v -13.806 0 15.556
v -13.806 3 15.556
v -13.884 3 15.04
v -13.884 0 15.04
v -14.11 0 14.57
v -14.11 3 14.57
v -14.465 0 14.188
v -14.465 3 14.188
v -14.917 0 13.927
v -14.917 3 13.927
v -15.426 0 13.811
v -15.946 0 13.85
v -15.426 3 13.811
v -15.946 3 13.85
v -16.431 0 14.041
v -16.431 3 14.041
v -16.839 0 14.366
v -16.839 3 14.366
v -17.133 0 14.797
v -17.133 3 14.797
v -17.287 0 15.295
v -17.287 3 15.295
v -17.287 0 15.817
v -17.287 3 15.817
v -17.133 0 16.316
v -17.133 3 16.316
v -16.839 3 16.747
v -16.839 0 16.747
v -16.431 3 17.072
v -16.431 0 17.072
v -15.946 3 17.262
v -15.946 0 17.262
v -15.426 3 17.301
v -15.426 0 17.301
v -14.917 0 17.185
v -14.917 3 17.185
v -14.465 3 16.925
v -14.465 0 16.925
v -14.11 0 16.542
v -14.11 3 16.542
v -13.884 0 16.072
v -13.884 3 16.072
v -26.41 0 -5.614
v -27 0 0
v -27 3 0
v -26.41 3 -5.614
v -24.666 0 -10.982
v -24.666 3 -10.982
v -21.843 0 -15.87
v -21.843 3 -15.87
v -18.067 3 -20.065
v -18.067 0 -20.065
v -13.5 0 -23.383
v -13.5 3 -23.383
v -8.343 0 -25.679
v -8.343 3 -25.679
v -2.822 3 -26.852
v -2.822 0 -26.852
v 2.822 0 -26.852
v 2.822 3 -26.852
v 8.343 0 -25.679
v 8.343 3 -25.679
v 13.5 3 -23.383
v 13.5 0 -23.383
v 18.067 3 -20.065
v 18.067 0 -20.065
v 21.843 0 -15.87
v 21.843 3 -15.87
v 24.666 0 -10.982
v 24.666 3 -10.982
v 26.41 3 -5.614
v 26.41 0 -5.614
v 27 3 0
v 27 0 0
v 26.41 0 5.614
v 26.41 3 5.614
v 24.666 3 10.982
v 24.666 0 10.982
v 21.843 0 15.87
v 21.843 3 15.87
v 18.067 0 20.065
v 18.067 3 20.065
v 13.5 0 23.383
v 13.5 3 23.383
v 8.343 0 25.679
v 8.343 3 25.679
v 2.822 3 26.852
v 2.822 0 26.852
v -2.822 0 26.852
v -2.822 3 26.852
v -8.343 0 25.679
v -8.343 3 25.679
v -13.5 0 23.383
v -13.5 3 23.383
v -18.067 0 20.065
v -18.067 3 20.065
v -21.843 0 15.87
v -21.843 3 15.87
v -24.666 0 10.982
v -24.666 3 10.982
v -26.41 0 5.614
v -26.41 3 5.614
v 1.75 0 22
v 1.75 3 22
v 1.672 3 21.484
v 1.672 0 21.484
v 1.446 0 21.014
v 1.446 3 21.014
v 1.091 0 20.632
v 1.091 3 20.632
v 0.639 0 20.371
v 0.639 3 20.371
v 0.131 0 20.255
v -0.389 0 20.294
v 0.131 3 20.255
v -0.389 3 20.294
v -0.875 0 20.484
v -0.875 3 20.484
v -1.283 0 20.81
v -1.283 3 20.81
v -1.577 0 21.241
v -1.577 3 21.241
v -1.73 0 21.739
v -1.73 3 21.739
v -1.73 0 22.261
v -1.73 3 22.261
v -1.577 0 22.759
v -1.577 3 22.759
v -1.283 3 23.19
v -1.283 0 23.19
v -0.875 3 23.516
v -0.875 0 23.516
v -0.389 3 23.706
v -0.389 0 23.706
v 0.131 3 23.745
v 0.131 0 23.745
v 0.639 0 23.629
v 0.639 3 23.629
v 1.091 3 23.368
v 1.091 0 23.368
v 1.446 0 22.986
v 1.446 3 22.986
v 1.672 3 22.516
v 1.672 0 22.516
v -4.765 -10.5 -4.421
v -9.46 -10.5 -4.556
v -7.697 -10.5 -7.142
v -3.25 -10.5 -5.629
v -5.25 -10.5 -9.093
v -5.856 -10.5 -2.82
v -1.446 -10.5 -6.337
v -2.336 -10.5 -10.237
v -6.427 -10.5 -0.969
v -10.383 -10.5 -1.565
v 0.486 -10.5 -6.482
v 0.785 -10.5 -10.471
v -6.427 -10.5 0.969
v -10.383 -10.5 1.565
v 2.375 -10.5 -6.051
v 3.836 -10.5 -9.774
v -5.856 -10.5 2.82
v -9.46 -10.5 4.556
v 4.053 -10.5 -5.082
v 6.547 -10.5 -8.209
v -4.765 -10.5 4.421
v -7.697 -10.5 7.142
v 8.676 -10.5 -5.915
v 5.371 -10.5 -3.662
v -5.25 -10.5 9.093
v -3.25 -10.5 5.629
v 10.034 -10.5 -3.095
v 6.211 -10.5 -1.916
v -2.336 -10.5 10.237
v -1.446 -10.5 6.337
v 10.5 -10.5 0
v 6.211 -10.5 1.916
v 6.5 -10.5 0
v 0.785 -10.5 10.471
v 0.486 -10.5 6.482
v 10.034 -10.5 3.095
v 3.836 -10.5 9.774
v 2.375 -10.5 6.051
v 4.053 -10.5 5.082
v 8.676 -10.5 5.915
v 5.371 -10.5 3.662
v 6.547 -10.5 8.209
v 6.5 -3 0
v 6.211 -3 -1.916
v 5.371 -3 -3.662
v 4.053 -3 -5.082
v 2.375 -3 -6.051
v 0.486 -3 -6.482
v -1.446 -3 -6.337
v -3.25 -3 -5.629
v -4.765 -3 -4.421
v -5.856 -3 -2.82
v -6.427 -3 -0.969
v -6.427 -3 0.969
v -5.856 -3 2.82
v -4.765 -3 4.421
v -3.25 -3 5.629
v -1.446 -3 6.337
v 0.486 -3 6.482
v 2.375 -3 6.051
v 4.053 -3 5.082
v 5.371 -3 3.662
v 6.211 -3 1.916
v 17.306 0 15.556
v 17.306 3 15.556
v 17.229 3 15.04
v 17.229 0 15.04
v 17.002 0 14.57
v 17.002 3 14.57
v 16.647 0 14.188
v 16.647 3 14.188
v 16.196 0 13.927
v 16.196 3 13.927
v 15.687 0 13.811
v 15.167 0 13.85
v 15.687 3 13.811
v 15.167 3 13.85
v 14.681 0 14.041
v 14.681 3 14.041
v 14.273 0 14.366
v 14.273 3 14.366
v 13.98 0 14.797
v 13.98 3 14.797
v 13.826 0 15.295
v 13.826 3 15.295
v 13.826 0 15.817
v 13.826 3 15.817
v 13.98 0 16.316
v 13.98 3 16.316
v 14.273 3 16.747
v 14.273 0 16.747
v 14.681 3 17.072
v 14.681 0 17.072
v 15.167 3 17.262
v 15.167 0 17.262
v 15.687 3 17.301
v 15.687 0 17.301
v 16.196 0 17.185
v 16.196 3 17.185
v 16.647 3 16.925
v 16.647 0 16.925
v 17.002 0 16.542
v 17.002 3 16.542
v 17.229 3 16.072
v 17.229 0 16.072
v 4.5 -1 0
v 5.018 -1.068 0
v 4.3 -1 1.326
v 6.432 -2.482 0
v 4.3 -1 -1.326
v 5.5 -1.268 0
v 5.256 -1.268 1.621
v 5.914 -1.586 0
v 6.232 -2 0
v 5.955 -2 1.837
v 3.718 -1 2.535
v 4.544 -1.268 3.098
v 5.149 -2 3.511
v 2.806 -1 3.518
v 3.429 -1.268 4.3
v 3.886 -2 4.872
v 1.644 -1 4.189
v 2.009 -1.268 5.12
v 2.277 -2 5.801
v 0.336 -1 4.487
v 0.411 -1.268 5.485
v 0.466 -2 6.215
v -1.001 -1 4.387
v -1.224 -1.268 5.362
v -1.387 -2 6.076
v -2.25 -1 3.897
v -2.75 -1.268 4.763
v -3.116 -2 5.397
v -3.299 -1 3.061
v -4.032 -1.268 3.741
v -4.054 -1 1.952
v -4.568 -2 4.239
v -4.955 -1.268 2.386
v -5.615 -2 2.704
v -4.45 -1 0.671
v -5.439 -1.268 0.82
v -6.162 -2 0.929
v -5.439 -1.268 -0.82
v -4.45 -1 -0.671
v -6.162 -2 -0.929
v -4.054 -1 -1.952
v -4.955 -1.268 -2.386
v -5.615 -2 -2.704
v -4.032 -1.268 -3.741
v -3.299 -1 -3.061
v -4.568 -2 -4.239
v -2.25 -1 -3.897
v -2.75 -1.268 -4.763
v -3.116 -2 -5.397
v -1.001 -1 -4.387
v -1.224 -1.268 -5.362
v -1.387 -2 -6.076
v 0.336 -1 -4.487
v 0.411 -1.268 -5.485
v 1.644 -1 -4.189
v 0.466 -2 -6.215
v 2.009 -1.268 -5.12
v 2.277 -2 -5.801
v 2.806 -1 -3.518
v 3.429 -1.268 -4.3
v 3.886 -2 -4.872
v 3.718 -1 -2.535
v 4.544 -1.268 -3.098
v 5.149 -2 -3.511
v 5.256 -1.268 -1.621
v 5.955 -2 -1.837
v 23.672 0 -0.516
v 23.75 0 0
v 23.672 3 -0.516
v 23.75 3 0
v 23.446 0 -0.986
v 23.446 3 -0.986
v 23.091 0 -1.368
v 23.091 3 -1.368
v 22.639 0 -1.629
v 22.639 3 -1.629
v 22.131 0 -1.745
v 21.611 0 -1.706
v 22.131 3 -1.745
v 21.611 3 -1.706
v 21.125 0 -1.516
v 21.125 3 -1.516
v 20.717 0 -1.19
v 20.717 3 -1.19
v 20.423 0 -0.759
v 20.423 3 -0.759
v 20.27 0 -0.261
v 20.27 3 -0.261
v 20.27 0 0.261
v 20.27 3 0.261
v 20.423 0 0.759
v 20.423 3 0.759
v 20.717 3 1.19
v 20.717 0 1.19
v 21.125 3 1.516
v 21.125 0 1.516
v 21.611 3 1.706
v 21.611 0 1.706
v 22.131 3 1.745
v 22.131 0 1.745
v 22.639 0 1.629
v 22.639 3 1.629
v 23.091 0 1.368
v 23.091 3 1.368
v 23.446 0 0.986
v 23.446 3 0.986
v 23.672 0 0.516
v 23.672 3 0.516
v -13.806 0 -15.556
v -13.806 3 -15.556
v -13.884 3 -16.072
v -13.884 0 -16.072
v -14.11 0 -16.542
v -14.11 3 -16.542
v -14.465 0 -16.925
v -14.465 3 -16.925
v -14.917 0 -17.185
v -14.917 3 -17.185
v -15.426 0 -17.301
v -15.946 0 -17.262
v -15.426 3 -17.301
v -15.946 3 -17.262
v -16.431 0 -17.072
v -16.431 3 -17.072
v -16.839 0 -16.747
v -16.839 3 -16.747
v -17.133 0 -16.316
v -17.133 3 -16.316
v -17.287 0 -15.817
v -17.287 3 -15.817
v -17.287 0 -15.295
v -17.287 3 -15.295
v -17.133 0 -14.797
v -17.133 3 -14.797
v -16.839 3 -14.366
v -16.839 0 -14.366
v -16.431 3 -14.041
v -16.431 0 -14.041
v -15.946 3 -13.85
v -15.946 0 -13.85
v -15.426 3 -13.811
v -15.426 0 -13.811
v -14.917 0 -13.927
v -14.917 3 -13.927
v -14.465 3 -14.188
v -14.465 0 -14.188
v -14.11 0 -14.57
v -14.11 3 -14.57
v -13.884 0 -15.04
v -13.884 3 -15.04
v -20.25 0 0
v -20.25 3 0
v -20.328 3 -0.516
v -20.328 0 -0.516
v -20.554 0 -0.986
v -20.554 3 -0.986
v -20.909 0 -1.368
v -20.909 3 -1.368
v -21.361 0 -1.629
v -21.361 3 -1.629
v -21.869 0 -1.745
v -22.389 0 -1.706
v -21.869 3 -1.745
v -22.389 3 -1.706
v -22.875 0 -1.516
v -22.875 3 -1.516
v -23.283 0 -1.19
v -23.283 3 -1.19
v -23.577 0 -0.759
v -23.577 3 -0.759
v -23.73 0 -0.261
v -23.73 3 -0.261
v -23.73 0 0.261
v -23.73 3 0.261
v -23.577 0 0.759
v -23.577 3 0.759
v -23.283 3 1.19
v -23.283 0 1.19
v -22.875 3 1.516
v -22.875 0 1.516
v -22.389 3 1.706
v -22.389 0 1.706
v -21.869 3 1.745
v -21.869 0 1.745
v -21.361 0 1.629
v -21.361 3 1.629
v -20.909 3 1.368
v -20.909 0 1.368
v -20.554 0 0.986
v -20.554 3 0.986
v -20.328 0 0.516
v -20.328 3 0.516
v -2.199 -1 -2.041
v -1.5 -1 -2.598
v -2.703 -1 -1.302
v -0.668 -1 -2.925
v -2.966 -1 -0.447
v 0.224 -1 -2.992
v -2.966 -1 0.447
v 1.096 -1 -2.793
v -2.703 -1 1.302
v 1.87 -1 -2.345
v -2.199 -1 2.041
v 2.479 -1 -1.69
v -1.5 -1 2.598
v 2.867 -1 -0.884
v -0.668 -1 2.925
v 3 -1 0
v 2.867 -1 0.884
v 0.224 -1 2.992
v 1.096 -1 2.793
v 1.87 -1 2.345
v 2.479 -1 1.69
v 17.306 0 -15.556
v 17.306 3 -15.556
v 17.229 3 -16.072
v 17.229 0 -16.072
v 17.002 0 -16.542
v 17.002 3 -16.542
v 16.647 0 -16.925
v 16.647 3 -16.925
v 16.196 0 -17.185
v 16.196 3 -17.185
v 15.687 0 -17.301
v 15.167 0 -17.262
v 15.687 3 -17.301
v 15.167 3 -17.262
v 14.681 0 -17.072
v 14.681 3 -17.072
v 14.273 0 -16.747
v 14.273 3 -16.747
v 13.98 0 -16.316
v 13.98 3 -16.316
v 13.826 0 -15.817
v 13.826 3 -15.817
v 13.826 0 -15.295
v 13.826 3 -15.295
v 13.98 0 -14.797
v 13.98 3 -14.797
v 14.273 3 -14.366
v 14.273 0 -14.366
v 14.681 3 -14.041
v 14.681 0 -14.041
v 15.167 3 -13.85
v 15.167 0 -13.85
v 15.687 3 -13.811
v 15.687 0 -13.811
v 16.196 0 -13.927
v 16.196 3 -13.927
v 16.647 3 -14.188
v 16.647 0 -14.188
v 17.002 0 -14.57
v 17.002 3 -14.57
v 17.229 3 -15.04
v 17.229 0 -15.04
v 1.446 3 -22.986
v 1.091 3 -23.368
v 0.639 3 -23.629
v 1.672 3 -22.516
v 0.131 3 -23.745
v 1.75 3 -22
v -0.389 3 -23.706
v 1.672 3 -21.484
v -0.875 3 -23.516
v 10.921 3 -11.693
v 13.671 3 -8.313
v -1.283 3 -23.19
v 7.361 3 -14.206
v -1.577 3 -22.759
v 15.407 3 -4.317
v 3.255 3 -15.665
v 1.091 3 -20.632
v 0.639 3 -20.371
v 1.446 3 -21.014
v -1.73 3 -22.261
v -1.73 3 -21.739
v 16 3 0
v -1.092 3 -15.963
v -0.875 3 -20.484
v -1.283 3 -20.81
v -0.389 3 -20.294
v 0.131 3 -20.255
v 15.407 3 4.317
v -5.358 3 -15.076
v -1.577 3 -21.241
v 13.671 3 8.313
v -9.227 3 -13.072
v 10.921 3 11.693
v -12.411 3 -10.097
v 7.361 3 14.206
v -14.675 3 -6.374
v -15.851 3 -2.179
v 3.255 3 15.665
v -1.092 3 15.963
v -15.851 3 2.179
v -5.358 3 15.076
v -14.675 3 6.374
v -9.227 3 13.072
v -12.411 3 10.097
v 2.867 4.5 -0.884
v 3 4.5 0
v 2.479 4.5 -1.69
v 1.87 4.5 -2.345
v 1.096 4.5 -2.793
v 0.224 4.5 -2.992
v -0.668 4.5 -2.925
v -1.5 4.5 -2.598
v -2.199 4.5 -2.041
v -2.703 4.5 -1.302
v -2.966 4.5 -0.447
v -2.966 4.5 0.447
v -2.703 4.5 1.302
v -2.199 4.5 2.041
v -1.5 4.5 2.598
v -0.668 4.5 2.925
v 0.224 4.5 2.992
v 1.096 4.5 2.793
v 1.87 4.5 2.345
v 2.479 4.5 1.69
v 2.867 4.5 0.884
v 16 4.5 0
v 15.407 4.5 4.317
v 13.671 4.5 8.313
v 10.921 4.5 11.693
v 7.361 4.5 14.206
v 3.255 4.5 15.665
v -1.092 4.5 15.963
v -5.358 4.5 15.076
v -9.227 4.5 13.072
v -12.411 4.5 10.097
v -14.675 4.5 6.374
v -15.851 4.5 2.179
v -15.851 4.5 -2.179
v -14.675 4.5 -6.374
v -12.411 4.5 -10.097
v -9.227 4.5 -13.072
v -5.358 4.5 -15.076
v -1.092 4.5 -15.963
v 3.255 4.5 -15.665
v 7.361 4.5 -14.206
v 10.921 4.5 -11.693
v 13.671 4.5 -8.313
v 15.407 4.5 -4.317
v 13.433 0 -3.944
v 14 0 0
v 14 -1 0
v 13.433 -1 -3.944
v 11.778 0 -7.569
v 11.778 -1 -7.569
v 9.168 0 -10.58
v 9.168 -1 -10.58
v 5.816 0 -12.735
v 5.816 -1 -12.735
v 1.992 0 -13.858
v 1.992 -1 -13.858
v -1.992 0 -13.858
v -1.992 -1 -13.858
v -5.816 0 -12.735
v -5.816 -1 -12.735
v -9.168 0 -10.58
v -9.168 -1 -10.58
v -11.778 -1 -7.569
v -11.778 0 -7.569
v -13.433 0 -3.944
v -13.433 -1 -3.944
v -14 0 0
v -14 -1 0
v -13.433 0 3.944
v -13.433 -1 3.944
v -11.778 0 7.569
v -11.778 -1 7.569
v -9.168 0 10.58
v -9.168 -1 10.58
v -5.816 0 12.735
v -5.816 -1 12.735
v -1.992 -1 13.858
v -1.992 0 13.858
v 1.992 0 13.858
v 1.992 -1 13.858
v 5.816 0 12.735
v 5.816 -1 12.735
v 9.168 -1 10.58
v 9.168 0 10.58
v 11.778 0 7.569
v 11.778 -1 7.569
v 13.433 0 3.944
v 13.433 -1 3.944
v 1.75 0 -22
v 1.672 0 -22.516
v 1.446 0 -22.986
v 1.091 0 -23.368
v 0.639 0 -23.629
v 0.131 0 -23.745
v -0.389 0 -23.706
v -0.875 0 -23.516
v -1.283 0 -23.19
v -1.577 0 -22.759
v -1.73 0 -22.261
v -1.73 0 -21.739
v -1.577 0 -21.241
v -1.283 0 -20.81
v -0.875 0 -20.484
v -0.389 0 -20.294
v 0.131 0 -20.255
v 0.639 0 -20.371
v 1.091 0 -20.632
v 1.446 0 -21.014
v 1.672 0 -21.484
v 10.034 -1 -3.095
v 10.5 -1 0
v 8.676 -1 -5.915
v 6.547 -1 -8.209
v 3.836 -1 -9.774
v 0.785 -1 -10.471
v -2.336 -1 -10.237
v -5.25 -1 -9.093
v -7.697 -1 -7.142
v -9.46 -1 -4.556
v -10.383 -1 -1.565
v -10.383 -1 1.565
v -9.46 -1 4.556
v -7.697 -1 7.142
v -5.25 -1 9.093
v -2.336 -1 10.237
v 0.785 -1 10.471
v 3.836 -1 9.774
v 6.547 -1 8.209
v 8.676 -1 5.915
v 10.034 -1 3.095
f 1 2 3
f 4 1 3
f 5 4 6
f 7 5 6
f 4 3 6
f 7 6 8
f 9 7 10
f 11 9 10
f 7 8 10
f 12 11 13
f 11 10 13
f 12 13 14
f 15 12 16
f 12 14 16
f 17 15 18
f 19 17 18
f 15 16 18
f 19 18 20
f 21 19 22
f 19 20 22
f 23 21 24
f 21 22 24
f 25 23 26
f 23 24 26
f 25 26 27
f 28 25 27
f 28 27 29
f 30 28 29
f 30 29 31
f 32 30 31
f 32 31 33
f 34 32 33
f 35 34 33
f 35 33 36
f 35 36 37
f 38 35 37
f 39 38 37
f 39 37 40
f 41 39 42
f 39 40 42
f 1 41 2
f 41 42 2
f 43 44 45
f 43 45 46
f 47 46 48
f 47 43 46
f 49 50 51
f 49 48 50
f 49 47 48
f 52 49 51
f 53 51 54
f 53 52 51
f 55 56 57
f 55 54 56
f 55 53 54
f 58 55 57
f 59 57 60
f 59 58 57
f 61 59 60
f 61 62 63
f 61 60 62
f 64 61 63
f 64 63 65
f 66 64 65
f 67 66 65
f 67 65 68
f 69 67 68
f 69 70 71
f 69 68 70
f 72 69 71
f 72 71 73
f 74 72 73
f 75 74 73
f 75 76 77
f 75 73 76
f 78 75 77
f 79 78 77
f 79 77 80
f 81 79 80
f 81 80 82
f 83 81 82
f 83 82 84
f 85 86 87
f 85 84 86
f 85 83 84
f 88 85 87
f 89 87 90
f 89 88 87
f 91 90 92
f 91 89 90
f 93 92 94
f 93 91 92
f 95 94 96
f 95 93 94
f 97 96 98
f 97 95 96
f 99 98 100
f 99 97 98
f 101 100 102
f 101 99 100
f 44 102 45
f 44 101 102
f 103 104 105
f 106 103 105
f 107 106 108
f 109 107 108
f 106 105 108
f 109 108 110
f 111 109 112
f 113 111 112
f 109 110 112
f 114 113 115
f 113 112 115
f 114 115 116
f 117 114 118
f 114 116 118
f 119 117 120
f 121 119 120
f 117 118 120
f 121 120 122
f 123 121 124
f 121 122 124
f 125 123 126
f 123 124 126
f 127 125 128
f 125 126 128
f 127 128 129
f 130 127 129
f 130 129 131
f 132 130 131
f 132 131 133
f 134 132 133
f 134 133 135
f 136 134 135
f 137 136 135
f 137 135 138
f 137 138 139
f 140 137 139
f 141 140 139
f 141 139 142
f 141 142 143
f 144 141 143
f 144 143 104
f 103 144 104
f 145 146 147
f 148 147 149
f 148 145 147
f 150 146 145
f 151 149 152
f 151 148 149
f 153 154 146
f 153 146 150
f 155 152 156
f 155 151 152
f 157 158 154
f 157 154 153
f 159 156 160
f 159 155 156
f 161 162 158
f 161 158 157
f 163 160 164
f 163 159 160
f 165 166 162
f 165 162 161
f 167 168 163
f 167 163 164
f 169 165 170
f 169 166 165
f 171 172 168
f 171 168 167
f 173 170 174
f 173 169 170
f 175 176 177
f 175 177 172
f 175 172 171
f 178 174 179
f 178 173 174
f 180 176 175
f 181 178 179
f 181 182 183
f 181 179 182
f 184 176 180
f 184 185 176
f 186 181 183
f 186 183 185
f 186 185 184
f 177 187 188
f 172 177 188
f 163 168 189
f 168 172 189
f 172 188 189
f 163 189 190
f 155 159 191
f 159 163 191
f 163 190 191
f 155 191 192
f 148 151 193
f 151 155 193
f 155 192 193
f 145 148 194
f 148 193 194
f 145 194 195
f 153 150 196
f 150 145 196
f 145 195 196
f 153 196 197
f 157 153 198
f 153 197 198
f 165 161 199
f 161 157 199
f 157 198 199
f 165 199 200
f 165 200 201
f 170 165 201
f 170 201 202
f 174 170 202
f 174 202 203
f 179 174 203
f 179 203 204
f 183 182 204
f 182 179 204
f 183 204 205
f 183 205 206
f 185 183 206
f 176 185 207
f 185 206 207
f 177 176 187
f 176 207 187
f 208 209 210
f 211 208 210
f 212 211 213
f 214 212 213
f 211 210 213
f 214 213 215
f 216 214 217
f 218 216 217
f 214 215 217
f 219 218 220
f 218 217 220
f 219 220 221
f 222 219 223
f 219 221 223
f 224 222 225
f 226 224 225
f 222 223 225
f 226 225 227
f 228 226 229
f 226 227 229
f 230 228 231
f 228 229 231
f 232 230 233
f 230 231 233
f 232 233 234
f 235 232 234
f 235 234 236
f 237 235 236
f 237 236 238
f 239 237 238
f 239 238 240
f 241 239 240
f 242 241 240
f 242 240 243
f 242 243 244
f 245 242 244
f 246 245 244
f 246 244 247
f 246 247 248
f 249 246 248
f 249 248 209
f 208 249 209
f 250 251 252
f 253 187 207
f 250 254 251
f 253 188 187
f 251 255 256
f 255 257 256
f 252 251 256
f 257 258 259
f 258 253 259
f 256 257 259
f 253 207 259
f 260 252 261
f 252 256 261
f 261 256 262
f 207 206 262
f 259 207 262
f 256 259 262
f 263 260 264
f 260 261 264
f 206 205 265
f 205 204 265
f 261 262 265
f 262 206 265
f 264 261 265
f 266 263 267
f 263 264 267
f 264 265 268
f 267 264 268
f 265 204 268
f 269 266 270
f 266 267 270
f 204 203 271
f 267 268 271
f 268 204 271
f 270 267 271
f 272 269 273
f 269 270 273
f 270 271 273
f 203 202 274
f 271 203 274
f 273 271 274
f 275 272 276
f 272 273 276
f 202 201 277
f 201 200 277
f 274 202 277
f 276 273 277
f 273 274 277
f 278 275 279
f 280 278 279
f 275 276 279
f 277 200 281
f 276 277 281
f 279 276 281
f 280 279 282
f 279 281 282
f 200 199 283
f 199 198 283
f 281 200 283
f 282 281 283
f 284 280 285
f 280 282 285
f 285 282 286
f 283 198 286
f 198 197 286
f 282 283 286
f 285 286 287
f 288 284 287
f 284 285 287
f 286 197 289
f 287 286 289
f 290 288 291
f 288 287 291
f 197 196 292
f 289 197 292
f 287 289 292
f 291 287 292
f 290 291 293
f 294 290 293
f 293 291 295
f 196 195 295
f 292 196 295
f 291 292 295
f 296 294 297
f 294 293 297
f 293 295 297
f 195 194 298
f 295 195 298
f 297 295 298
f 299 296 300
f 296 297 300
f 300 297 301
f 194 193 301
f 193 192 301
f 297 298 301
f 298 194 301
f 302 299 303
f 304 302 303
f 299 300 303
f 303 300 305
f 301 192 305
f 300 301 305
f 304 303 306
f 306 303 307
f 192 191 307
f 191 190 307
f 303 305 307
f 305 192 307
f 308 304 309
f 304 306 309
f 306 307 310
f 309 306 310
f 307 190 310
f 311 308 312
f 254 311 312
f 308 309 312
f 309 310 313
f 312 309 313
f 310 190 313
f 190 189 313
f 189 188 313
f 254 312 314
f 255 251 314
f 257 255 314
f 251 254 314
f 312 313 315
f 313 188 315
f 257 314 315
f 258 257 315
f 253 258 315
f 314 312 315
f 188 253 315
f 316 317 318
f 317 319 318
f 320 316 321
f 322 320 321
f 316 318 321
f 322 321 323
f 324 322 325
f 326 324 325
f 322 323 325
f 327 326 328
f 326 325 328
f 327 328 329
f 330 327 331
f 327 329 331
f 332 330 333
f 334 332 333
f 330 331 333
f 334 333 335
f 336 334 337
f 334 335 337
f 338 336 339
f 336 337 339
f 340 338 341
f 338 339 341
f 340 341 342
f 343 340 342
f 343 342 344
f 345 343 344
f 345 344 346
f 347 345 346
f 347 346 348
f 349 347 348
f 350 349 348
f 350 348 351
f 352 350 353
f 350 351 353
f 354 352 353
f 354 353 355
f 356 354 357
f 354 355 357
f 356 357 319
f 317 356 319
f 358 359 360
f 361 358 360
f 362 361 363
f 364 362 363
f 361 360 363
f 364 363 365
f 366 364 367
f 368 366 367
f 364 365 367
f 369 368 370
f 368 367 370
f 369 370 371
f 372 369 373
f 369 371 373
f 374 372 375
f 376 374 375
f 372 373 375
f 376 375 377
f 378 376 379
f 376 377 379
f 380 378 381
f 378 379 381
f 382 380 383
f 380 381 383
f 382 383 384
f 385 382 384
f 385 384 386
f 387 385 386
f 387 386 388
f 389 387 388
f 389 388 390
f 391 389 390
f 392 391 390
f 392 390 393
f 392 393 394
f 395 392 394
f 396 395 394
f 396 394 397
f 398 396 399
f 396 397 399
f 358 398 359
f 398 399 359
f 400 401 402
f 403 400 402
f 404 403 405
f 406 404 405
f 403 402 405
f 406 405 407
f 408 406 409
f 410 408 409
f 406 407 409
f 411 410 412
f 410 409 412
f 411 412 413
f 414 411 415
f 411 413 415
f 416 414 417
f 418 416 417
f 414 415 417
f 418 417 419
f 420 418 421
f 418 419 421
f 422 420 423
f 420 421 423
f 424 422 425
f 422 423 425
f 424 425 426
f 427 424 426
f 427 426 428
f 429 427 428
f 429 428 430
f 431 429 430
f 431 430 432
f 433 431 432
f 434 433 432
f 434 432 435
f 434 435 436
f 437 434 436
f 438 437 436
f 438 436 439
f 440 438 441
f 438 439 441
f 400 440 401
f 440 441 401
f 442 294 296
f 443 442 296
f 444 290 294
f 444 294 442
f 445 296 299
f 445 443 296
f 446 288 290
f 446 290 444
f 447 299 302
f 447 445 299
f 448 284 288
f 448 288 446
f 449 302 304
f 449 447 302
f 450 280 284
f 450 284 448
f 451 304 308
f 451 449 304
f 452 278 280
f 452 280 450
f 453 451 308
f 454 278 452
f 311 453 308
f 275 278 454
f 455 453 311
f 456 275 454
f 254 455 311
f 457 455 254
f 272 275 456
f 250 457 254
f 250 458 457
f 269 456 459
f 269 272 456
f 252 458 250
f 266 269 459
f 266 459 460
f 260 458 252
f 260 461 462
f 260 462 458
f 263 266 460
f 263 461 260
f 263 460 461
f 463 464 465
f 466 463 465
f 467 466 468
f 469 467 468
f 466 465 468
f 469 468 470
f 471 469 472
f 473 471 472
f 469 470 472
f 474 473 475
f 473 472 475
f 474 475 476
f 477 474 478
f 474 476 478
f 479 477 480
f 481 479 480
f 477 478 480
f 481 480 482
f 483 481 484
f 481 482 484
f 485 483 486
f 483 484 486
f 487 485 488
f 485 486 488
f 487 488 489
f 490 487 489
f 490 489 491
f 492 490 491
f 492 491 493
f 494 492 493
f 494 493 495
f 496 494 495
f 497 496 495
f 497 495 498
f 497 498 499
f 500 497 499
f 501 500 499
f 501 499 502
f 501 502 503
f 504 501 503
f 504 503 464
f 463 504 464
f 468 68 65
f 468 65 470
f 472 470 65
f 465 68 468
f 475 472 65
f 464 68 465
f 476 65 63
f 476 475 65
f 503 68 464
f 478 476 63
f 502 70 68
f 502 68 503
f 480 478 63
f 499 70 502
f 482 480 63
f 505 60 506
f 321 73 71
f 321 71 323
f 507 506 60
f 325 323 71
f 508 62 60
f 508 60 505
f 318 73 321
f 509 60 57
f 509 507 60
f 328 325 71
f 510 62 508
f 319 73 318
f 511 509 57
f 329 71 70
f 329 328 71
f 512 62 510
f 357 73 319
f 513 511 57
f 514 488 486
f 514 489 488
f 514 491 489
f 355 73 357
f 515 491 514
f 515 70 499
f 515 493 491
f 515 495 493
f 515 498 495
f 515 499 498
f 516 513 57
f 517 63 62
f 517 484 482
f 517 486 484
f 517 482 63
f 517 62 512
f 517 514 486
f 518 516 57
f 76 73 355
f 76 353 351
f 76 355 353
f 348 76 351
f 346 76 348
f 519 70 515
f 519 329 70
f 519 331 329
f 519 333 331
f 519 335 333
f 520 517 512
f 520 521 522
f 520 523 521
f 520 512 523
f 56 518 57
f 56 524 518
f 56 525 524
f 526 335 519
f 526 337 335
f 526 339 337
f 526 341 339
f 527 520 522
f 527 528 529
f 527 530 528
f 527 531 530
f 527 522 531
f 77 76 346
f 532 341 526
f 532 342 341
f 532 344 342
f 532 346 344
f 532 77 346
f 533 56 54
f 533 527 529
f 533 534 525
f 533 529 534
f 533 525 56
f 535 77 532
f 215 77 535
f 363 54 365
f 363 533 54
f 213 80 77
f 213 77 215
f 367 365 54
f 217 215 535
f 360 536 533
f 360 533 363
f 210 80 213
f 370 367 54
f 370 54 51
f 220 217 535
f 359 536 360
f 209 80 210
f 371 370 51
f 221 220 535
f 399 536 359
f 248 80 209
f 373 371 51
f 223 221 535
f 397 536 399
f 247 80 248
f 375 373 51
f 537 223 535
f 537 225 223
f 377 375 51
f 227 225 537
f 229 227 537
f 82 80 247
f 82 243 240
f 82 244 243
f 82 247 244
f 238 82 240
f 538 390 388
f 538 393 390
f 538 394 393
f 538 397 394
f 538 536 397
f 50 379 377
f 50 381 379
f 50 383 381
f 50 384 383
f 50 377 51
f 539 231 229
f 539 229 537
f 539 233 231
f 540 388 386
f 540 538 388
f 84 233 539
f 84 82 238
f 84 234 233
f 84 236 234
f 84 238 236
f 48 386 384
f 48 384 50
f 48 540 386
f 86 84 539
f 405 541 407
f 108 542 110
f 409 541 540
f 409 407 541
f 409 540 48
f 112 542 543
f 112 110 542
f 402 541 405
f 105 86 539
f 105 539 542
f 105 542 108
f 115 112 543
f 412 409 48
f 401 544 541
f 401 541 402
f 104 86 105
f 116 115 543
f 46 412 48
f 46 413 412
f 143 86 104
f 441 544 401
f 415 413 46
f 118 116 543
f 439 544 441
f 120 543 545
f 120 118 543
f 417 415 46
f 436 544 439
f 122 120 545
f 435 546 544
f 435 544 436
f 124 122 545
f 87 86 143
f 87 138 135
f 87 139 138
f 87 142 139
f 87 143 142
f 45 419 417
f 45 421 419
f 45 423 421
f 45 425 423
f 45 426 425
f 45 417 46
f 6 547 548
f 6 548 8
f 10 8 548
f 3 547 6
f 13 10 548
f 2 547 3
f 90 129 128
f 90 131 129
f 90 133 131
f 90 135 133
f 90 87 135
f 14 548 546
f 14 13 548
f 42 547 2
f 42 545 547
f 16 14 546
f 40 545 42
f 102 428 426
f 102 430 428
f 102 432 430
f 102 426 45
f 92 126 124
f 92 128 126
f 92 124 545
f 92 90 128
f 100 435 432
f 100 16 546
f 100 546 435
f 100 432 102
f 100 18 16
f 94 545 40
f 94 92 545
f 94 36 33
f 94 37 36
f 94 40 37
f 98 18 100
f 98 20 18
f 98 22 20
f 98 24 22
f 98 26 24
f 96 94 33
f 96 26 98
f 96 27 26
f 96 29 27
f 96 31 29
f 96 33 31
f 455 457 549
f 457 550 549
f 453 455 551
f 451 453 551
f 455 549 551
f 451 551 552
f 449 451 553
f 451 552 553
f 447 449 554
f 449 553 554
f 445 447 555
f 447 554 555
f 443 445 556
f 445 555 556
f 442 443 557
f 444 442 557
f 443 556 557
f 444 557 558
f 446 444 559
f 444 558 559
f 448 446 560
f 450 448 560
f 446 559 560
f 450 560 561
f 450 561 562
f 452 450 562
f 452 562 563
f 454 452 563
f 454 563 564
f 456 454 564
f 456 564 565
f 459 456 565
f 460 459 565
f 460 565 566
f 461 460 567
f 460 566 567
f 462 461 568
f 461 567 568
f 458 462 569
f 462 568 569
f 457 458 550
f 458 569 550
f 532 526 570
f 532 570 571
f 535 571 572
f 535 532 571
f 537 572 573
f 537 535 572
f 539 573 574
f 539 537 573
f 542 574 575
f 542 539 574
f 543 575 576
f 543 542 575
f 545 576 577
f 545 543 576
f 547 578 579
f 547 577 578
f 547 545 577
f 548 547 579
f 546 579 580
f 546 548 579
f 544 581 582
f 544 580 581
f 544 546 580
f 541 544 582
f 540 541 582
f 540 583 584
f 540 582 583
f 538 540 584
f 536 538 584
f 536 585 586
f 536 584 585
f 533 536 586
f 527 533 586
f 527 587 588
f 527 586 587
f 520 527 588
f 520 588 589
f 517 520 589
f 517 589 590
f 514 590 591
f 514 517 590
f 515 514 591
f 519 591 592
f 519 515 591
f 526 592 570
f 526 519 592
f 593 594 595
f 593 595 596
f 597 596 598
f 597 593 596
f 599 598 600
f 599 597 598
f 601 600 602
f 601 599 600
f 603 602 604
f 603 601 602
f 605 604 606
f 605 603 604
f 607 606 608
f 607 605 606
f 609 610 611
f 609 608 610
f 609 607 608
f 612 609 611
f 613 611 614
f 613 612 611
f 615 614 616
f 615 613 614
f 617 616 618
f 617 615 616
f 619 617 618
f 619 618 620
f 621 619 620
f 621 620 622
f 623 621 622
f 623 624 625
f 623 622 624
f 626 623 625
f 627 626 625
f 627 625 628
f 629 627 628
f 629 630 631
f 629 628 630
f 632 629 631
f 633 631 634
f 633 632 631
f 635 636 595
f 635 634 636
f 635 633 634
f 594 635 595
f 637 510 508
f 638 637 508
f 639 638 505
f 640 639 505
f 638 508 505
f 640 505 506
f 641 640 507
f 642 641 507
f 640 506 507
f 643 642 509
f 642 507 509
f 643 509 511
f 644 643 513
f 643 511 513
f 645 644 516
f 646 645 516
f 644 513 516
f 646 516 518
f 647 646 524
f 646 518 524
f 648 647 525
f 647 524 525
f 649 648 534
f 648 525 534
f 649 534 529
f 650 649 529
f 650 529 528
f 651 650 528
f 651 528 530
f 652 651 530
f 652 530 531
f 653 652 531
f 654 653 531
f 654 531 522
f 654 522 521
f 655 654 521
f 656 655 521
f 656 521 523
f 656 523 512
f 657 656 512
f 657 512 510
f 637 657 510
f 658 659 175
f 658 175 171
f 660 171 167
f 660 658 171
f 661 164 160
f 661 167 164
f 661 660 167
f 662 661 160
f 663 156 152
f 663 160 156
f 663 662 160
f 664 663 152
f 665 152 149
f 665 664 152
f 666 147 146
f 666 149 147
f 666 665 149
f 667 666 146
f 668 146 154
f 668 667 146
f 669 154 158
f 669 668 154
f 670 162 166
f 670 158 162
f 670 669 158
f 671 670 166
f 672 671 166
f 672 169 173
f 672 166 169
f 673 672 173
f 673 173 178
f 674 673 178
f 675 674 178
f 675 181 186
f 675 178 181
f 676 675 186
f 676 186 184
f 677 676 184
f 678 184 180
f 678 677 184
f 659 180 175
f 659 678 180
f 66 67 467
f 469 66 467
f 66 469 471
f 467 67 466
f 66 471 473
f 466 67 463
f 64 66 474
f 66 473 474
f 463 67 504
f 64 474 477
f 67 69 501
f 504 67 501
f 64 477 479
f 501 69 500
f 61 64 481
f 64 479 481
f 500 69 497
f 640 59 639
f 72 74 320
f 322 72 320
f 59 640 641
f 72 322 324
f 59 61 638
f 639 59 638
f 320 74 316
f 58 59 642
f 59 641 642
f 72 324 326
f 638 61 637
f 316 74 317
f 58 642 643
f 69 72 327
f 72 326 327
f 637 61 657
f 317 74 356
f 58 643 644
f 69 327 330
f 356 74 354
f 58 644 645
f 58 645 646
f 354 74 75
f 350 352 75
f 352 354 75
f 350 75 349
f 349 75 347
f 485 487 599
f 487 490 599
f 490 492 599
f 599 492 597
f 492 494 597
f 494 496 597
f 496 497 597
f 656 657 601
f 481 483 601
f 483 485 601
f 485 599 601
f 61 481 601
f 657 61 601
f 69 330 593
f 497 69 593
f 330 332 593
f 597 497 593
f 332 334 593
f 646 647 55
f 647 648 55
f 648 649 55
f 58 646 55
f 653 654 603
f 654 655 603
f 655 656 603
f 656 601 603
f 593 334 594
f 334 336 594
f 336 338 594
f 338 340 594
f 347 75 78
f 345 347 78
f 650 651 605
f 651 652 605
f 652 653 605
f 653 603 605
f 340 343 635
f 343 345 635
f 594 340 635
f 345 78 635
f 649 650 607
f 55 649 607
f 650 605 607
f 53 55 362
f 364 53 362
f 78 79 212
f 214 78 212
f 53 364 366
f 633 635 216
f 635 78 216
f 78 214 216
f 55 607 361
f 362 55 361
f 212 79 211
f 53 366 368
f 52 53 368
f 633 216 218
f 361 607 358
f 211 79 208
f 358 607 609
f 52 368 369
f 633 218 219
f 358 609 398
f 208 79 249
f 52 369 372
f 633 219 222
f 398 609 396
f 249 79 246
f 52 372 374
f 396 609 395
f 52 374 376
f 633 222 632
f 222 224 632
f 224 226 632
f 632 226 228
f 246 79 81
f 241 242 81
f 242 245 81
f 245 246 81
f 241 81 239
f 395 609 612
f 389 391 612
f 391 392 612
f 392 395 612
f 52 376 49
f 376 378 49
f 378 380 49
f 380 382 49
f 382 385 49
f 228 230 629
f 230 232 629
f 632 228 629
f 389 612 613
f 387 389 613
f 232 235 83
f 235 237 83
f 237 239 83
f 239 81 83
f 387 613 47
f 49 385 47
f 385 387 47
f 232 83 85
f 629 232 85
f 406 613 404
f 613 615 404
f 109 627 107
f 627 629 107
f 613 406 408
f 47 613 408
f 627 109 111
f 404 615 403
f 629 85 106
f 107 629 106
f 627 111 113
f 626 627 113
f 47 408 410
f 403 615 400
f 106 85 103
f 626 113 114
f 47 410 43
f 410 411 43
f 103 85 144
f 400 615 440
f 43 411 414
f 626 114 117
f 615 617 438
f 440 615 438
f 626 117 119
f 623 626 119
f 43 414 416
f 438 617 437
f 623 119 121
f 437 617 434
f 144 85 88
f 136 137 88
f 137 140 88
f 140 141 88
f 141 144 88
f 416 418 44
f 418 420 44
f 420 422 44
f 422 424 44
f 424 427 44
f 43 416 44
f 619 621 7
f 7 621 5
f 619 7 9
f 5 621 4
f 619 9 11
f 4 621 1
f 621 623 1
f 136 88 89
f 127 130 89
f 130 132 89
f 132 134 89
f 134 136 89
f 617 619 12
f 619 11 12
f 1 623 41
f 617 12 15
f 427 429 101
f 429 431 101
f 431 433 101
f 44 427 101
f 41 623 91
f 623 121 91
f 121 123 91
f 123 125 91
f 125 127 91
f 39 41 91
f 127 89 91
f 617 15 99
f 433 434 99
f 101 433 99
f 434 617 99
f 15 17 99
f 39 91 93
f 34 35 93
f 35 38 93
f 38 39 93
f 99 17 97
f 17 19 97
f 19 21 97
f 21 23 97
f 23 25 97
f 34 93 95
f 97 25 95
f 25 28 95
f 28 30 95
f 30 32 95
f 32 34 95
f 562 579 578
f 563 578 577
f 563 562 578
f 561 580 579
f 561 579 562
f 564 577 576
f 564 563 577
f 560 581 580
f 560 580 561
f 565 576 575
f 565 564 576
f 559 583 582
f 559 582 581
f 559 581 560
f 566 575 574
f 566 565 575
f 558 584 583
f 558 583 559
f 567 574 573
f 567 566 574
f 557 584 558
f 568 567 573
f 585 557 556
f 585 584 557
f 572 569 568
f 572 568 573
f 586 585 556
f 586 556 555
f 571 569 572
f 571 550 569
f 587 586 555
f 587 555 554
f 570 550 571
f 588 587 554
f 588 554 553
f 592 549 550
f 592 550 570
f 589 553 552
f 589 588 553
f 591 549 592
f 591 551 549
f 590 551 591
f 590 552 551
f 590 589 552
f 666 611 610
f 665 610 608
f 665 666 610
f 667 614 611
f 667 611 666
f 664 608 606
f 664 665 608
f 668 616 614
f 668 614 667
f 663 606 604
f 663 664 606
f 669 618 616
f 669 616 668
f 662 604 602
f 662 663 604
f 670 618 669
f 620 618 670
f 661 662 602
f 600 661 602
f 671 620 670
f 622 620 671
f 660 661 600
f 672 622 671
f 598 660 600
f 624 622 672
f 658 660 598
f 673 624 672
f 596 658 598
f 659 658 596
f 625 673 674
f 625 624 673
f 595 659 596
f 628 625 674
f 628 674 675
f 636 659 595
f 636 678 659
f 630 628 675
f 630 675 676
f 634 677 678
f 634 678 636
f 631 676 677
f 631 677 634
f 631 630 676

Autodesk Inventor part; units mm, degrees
ref_plane "YZ Plane" through (0, 0, 0) normal (1, 0, 0) x (0, 1, 0)
ref_plane "XZ Plane" through (0, 0, 0) normal (0, 1, 0) x (-1, 0, 0)
ref_plane "XY Plane" through (0, 0, 0) normal (0, 0, 1) x (1, 0, 0)
sketch "Sketch1" plane through (0, 0, 0) normal (0, 1, 0) x (-1, 0, 0)
  circle A0 centre (0, 0) radius 27
  dimension "d0" = 54
extrude "Extrusion1" add sketch "Sketch1" along normal blind 3
sketch "Sketch2" plane through (0, 3, 0) normal (0, 1, 0) x (1, 0, 0)
  circle A0 centre (0, 0) radius 16
  dimension "d3" = 32
extrude "Extrusion2" add sketch "Sketch2" along normal blind 1.5
sketch "Sketch3" plane through (0, 0, 0) normal (0, -1, 0) x (1, 0, 0)
  circle A0 centre (0, 0) radius 14
  dimension "d6" = 28
extrude "Extrusion3" add sketch "Sketch3" along normal blind 1
sketch "Sketch4" plane through (0, 4.5, 0) normal (0, 1, 0) x (1, 0, 0)
  circle A0 centre (0, 0) radius 3
  dimension "d9" = 6
extrude "Extrusion4" cut sketch "Sketch4" against normal through all
sketch "Sketch5" plane through (0, -1, 0) normal (0, -1, 0) x (1, 0, 0)
  circle A0 centre (0, 0) radius 6.5
  circle A1 centre (0, 0) radius 10.5
  dimension "d12" = 13
  dimension "d16" = 21
extrude "Extrusion6" add sketch "Sketch5" along normal blind 9.5
fillet "Fillet1" radius 2 1 edges at (-6.5, -1, 0)
sketch "Sketch7" plane through (0, 3, 0) normal (0, 1, 0) x (1, 0, 0)
  circle A0 centre (0, 0) radius 3 construction
  circle A1 centre (0, 0) radius 22 construction
  circle A2 centre (-22, 0) radius 1.75
  circle A3 centre (-15.5563, -15.5563) radius 1.75
  circle A4 centre (0, -22) radius 1.75
  circle A5 centre (15.5563, -15.5563) radius 1.75
  circle A6 centre (22, 0) radius 1.75
  circle A7 centre (15.5563, 15.5563) radius 1.75
  circle A8 centre (0, 22) radius 1.75
  circle A9 centre (-15.5563, 15.5563) radius 1.75
  dimension "d20" = 44
  dimension "d22" = 3.5
  dimension "d25" = 360
extrude "Extrusion7" cut sketch "Sketch7" against normal through all
properties part number "reverse gear lower cylinder cover"
